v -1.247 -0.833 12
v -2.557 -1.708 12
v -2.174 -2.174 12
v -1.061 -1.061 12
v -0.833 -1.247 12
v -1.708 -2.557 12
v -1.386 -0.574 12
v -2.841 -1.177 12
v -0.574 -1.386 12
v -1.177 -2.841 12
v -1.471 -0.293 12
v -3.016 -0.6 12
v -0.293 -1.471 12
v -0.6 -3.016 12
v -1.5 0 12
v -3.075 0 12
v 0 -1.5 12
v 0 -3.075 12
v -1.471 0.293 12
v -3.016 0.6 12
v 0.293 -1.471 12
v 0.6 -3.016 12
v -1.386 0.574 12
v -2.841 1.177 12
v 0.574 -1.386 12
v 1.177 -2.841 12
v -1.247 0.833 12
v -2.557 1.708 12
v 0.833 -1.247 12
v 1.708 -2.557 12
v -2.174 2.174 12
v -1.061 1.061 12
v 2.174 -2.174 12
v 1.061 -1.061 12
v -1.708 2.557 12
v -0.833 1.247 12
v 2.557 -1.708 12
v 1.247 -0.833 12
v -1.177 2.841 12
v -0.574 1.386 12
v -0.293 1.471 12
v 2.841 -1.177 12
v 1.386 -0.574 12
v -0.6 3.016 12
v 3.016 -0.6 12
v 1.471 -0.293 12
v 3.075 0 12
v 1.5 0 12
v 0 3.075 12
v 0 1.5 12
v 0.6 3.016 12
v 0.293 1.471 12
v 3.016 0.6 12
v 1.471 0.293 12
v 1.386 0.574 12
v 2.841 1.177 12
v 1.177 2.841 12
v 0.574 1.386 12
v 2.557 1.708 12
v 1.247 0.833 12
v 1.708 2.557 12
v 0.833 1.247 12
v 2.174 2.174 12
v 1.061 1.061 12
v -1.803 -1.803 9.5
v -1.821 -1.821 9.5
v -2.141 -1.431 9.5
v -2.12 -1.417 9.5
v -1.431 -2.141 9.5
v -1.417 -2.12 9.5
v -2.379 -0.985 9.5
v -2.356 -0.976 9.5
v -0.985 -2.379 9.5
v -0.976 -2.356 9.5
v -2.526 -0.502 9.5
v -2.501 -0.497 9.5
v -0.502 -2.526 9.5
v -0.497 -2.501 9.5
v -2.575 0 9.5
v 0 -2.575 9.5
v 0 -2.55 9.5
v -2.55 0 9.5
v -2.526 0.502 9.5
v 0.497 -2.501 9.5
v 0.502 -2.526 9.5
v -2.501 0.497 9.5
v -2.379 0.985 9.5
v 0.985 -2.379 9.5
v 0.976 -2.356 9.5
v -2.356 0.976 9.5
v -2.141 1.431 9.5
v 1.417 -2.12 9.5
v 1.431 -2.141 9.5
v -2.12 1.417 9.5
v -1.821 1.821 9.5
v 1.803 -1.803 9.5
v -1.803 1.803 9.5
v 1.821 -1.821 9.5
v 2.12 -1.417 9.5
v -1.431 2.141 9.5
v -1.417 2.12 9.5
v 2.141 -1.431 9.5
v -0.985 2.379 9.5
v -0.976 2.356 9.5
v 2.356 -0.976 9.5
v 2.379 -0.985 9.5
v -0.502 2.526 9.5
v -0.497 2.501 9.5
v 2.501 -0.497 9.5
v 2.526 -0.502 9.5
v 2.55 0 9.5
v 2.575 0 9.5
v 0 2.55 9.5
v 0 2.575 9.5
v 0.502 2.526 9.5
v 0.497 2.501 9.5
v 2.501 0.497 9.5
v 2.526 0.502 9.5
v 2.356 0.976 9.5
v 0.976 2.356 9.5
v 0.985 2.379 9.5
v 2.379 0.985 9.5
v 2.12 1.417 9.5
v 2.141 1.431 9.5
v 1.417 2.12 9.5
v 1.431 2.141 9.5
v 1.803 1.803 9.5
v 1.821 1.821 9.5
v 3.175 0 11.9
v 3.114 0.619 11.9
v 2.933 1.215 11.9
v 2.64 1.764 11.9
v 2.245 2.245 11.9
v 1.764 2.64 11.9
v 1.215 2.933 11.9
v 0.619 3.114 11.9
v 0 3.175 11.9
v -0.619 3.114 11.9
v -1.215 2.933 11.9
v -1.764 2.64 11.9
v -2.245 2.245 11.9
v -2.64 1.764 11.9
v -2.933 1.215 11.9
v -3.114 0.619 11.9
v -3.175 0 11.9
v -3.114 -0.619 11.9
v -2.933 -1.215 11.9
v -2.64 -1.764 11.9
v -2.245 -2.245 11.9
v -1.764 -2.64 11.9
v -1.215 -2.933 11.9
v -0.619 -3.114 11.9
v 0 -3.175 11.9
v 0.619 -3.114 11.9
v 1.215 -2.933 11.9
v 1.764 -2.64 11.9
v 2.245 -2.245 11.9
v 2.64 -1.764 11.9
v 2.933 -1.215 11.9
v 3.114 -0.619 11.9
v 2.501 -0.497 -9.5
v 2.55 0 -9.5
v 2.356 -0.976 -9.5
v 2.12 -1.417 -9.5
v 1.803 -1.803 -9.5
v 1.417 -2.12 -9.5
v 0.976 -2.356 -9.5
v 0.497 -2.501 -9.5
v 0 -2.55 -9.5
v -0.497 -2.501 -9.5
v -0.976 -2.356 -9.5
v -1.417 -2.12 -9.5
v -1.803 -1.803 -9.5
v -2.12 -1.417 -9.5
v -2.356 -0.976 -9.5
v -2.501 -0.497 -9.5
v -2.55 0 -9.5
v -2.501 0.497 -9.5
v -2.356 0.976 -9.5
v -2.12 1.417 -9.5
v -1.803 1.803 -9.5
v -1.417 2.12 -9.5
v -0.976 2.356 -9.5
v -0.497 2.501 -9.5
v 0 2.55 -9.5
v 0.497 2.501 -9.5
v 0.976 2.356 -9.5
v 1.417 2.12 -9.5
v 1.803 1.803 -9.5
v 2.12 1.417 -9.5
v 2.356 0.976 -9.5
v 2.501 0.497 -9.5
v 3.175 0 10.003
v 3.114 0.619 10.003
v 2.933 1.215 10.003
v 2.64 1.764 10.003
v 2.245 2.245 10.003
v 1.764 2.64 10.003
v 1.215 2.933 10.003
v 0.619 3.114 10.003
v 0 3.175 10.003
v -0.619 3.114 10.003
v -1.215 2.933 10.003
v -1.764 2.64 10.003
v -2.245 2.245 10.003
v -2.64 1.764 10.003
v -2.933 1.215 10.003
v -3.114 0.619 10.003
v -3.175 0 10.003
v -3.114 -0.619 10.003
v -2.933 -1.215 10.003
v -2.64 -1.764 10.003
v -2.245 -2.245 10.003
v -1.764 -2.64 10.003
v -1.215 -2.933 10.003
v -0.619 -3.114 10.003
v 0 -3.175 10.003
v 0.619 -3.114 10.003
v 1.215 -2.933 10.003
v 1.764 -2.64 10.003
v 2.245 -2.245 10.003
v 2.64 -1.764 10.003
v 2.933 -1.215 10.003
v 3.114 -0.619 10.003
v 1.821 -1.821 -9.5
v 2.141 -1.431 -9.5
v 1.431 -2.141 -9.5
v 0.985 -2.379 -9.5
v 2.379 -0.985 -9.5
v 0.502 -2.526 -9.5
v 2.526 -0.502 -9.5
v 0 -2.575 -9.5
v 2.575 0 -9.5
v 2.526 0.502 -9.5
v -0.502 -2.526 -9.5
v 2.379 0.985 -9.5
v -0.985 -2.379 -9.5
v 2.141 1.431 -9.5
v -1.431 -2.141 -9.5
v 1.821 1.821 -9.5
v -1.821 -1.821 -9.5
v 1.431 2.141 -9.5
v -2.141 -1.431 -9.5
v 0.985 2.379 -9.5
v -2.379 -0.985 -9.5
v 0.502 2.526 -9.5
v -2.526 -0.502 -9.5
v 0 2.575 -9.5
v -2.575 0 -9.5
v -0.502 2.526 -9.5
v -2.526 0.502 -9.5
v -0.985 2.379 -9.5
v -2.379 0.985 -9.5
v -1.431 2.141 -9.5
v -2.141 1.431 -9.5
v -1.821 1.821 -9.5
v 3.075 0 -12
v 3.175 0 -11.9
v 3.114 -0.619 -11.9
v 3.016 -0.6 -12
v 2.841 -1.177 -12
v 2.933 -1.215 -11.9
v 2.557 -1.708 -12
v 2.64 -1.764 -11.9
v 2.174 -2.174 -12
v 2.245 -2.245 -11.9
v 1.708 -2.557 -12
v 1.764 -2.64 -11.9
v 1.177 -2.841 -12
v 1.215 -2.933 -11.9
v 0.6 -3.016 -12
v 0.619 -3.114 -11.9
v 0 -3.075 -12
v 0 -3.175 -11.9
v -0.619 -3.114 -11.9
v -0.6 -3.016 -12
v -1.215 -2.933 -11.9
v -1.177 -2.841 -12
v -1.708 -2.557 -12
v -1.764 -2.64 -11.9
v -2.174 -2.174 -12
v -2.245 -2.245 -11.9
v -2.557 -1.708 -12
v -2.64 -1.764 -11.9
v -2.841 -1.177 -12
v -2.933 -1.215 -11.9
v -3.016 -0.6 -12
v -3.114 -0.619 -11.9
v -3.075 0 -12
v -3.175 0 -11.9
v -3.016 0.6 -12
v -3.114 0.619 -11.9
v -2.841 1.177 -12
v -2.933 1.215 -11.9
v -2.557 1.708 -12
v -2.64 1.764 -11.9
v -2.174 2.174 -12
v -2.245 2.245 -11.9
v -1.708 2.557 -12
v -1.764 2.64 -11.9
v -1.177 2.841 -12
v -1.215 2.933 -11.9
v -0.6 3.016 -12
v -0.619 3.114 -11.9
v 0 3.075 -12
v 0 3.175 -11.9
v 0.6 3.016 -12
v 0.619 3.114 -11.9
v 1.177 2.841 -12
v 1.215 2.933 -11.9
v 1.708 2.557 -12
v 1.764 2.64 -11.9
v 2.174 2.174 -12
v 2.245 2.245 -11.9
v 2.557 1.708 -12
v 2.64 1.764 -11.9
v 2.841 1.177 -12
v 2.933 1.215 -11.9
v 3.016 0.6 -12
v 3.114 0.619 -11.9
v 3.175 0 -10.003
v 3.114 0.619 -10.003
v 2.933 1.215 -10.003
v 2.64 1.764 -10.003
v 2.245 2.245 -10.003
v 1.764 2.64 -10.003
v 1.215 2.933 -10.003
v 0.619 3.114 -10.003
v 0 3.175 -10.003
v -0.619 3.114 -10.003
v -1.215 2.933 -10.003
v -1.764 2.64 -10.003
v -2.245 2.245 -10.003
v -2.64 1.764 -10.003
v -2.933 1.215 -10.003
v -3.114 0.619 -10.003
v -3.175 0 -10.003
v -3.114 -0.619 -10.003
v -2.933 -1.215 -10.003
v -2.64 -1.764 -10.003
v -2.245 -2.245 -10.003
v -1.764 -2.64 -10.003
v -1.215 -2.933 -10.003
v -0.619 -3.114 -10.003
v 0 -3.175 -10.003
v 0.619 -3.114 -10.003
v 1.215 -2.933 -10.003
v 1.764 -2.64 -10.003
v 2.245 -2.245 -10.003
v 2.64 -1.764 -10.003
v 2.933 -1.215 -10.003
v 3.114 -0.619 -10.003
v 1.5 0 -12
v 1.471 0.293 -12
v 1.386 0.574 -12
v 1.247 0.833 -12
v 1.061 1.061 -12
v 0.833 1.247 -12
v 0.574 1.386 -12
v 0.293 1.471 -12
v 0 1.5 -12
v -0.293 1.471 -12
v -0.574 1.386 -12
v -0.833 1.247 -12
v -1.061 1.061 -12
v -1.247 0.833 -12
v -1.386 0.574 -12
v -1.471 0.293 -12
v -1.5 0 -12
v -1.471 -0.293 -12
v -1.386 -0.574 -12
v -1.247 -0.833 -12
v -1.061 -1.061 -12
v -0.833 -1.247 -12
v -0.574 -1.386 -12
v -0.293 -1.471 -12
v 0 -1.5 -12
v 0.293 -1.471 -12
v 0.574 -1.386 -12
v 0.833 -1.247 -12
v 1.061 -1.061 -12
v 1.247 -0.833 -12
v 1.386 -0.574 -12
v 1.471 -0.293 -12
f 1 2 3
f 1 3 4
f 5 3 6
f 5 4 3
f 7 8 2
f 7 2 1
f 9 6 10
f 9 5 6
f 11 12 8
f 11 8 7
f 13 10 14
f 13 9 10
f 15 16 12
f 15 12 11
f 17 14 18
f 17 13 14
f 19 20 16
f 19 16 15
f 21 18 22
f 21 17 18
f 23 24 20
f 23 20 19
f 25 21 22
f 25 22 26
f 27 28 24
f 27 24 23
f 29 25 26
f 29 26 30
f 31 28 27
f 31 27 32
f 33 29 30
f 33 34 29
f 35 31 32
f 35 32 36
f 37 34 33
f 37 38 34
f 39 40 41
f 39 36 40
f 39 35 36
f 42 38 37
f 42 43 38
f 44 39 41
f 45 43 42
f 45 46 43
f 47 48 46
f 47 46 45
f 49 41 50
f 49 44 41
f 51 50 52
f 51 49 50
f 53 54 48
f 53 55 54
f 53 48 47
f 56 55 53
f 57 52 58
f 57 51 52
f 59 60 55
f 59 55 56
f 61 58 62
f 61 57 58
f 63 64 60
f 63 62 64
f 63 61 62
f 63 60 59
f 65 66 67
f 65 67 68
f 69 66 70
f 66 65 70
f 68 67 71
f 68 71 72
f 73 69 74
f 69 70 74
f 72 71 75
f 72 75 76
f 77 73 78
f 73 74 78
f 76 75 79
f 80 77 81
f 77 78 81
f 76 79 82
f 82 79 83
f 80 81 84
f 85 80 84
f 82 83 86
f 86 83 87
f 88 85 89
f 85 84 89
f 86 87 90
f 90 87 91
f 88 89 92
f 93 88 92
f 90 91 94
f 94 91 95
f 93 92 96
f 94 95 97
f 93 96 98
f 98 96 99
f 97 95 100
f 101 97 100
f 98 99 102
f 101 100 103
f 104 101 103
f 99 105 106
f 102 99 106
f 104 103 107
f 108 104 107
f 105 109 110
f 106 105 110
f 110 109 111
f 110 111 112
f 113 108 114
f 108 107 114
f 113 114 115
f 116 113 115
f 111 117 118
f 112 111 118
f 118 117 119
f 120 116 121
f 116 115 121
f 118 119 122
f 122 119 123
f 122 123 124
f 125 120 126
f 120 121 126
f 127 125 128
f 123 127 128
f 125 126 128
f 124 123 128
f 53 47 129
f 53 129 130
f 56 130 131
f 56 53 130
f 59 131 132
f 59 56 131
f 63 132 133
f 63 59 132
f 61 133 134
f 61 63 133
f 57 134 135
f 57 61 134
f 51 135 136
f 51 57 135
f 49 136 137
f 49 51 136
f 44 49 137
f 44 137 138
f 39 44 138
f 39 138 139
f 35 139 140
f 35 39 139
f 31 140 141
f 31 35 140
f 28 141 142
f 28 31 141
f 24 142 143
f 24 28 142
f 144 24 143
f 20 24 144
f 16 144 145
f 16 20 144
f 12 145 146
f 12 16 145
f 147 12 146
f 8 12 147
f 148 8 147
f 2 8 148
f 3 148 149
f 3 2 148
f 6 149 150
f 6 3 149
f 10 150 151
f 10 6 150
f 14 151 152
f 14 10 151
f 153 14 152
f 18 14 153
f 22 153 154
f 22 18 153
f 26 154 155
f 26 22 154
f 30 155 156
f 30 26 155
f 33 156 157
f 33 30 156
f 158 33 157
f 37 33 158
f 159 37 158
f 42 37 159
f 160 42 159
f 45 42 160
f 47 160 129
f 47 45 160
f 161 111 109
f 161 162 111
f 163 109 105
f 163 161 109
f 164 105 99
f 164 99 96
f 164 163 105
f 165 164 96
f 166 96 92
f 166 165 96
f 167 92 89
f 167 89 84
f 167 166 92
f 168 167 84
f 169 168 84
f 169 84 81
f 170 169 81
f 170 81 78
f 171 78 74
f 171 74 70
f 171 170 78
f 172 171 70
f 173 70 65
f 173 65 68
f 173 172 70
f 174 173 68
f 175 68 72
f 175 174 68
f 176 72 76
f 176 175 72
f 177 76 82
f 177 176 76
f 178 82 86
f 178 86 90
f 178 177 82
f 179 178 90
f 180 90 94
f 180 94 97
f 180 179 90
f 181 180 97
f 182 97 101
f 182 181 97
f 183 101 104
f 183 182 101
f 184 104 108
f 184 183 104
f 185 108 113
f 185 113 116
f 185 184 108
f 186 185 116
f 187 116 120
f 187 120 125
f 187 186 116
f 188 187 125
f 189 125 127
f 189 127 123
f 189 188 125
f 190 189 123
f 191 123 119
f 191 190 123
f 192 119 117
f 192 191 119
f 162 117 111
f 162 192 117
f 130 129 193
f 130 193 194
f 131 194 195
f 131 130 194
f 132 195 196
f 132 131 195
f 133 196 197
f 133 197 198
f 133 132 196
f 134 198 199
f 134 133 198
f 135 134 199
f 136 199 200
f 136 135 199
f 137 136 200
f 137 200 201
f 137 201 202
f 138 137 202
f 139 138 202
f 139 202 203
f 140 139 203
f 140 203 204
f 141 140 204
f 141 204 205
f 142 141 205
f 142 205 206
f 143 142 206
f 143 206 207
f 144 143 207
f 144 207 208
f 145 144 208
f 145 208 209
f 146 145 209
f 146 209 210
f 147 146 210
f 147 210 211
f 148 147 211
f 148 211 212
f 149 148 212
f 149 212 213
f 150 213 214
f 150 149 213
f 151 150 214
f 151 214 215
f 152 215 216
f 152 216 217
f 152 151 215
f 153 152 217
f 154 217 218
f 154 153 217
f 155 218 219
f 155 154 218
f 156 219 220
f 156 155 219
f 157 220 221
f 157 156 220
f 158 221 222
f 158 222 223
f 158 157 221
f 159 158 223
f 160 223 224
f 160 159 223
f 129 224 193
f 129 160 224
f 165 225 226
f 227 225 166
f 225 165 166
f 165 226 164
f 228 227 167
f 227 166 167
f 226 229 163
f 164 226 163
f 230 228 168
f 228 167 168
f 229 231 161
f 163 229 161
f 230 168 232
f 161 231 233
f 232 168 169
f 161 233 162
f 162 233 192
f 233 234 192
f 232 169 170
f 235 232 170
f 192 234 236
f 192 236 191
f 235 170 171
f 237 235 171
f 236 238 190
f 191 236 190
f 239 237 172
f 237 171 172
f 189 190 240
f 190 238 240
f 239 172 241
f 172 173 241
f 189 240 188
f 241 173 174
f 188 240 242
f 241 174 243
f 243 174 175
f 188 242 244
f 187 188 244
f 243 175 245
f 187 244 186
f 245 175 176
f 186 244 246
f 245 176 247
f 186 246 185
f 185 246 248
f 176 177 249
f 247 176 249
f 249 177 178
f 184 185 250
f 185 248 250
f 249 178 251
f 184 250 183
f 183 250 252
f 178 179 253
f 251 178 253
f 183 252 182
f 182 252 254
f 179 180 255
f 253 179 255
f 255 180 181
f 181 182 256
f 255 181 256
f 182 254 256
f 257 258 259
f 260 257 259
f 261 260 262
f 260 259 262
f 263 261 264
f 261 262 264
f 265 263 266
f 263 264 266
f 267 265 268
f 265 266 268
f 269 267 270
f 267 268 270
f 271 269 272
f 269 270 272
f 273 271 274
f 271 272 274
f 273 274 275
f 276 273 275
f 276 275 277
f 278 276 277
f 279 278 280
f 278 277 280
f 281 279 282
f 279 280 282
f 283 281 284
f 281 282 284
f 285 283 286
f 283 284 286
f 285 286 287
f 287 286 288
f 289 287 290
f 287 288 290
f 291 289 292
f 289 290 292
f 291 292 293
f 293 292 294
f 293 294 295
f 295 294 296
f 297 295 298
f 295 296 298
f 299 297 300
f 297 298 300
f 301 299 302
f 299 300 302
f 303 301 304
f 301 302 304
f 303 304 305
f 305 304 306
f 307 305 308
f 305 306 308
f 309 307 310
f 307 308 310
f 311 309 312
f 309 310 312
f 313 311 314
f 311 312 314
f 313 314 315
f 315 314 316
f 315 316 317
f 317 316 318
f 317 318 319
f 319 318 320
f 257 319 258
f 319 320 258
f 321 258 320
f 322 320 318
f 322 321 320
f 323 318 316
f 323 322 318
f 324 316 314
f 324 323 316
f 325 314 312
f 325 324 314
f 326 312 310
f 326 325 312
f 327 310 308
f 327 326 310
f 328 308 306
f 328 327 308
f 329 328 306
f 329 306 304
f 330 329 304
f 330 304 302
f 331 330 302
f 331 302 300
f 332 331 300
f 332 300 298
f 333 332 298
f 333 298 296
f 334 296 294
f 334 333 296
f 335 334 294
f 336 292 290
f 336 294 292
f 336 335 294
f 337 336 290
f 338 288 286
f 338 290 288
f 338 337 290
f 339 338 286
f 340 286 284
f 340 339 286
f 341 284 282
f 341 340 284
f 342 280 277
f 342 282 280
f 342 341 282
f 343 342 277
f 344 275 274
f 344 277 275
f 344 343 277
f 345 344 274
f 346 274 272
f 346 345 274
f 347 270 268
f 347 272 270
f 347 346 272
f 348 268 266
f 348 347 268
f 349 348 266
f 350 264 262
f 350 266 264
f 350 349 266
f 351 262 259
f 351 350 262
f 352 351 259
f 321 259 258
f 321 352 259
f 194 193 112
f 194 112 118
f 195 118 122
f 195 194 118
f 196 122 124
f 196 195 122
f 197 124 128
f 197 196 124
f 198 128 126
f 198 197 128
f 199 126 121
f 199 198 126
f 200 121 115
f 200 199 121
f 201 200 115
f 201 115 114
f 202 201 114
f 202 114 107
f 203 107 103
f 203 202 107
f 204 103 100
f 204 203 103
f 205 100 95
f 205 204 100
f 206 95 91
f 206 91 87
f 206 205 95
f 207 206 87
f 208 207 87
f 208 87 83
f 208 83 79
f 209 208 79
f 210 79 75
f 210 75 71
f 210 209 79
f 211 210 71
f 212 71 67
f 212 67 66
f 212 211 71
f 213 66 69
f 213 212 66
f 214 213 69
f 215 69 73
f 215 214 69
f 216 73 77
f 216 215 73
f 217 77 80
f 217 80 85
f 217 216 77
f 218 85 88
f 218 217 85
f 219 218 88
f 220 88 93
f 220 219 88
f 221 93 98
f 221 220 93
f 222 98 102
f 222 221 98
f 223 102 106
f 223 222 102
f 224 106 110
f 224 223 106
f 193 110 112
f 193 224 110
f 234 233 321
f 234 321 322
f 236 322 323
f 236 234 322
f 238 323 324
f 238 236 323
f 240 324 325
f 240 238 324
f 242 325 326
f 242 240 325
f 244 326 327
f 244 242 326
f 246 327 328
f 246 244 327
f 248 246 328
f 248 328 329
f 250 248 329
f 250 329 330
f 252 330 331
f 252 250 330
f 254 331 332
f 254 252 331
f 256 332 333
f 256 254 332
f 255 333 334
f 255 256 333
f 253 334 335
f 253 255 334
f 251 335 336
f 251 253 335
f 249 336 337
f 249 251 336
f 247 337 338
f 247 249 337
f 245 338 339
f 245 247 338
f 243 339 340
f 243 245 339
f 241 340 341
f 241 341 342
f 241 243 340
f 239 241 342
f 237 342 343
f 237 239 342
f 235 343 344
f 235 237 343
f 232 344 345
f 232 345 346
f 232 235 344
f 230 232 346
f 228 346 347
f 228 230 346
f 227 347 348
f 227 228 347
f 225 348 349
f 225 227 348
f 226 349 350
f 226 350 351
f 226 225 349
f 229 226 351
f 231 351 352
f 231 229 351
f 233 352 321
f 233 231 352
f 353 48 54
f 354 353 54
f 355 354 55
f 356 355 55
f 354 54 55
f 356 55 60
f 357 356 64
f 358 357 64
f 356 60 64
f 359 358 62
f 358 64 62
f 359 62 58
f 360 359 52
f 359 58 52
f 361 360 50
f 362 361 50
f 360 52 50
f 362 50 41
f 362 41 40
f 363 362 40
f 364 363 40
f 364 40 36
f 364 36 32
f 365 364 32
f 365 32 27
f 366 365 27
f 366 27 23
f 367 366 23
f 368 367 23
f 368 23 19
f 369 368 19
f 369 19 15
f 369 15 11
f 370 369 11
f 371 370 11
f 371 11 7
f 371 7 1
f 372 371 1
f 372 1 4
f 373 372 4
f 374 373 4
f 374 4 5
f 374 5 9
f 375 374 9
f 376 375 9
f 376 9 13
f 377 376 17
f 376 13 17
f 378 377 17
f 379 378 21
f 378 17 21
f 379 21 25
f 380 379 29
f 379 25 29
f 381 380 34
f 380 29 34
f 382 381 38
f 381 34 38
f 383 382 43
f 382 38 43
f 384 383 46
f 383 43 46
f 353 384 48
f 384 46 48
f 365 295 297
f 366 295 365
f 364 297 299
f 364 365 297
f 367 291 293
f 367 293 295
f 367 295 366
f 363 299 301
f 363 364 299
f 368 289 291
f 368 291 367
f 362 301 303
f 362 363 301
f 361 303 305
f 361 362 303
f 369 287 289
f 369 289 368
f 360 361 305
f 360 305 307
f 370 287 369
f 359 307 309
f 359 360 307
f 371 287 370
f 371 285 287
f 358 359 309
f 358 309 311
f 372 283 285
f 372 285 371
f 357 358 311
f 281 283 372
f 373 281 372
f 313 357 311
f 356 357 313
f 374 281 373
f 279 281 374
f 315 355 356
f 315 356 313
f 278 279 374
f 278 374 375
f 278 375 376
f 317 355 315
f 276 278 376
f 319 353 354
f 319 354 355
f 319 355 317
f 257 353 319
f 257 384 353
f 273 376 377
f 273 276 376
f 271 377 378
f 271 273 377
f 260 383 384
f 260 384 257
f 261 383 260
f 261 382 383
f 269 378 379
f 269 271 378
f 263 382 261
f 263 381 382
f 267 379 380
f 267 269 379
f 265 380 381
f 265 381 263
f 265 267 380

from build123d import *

# Parameters (mm, degrees)
IZIM1_W                     = 19
IZIM1_H                     = 2.55
IZIM4_R                     = 2.575
Y_KSEKLIK_EKSTR_ZYON1_DEPTH = 0.6
IZIM5_R                     = 3.175
Y_KSEKLIK_EKSTR_ZYON2_DEPTH = 1.9
IZIM7_R                     = 2.575
Y_KSEKLIK_EKSTR_ZYON4_DEPTH = 0.6
Y_KSEKLIK_EKSTR_ZYON5_START = 1.9
IZIM8_R                     = 3.175
Y_KSEKLIK_EKSTR_ZYON5_DEPTH = 1.9
IZIM9_R                     = 1.5
KES_EKSTR_ZYON1_DEPTH       = 100
PAH1_SIZE                   = 0.1


# Read off the part's stored shape, not the designer's step: Draft2, Draft3
with BuildPart() as part:
    # Çizim1 → Döndür3 (revolve)
    with BuildSketch(Plane(origin=(0, 0, 0), x_dir=(0, 0, -1), z_dir=(1, 0, 0)), mode=Mode.PRIVATE) as d_nd_r3_sk:
        with Locations((0, -1.275)):
            Rectangle(IZIM1_W, IZIM1_H)
    revolve(d_nd_r3_sk.sketch.rotate(Axis((0, 0, 15.544933078), (0, 0, -1)), 270), axis=Axis((0, 0, 15.544933078), (0, 0, -1)))

    # Çizim4 → Yükseklik-Ekstrüzyon1 (add)
    with BuildSketch(Plane(origin=(0, 0, -9.5), x_dir=(-1, 0, 0), z_dir=(0, 0, -1))):
        Circle(IZIM4_R)
    extrude(amount=Y_KSEKLIK_EKSTR_ZYON1_DEPTH)

    # Çizim5 → Yükseklik-Ekstrüzyon2 (add)
    with BuildSketch(Plane(origin=(0, 0, -10.1), x_dir=(-1, 0, 0), z_dir=(0, 0, -1))):
        with Locations(Location((0, 0, 0), (0, 0, 180))):
            Circle(IZIM5_R)
    extrude(amount=Y_KSEKLIK_EKSTR_ZYON2_DEPTH)

    # Draft2 outline → Draft2 (revolve)
    with BuildSketch(Plane.XZ):
        Polygon((3.175, -10.003459779), (2.575, -9.5), (2.575, -10.1), (3.175, -10.1), align=None)
    revolve(axis=Axis((0, 0, 0), (0, 0, 1)))

    # Çizim7 → Yükseklik-Ekstrüzyon4 (add)
    with BuildSketch(Plane.XY.offset(9.5)):
        Circle(IZIM7_R)
    extrude(amount=Y_KSEKLIK_EKSTR_ZYON4_DEPTH)

    # Çizim8 → Yükseklik-Ekstrüzyon5 (add)
    with BuildSketch(Plane.XY.offset(10.1).offset(Y_KSEKLIK_EKSTR_ZYON5_START)):
        Circle(IZIM8_R)
    extrude(amount=-Y_KSEKLIK_EKSTR_ZYON5_DEPTH)

    # Draft3 outline → Draft3 (revolve)
    with BuildSketch(Plane.XZ):
        Polygon((2.575, 9.5), (3.175, 10.003459779), (3.175, 10.1), (2.575, 10.1), align=None)
    revolve(axis=Axis((0, 0, 0), (0, 0, 1)))

    # Çizim9 → Kes-Ekstrüzyon1 (cut)
    with BuildSketch(Plane.XY.offset(12)):
        Circle(IZIM9_R)
    extrude(amount=-KES_EKSTR_ZYON1_DEPTH, mode=Mode.SUBTRACT)

    # Pah1
    pah1_edges = [part.edges().sort_by_distance(p)[0] for p in [
        (-3.175, 0, -12),
        (-3.175, 0, 12),
    ]]
    chamfer(pah1_edges, length=PAH1_SIZE)


solid = part.part
